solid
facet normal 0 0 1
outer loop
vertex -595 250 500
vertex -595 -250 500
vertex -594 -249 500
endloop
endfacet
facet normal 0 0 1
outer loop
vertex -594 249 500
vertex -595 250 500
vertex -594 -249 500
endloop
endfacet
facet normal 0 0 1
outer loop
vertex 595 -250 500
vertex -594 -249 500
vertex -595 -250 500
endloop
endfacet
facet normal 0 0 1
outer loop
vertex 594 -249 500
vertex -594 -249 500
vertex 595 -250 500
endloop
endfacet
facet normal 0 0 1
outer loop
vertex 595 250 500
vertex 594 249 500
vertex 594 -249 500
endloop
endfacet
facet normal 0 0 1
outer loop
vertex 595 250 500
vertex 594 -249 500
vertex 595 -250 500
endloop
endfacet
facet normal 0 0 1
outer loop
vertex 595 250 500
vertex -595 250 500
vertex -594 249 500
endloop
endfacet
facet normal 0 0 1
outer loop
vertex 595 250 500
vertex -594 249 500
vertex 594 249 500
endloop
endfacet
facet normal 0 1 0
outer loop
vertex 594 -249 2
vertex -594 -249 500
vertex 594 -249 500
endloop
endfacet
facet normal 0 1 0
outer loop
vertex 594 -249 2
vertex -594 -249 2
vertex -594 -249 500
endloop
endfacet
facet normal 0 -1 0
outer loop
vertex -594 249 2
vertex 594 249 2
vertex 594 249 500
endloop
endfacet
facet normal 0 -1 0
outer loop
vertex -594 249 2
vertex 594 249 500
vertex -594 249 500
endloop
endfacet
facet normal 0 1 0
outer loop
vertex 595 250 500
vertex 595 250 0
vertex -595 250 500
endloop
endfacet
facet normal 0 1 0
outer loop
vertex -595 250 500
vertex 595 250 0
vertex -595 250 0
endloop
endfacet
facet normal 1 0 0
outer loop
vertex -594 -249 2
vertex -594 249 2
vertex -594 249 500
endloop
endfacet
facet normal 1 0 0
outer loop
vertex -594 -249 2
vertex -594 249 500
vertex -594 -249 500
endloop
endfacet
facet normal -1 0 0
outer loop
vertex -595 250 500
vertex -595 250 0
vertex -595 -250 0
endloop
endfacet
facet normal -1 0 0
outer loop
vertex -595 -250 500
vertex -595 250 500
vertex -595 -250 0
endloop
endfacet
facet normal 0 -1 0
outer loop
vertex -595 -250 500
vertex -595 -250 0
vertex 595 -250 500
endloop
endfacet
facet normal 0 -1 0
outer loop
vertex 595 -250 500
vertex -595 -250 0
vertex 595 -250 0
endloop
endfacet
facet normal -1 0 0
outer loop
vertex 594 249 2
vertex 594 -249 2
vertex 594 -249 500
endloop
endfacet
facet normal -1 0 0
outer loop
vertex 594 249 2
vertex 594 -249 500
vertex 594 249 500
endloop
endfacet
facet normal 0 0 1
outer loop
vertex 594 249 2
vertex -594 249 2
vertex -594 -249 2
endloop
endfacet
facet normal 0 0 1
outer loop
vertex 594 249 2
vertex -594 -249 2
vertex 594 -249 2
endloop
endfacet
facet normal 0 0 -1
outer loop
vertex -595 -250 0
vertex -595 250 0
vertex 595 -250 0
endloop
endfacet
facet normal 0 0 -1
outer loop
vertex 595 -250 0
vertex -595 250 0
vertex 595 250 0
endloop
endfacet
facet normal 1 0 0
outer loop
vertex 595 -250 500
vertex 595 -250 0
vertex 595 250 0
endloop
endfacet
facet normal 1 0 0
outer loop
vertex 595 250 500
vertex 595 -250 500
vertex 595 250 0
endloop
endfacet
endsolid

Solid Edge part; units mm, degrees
sketch "Sketch1" plane through (0, 0, 0) normal (0, 0, 1) x (1, 0, 0)
  line L0 (594, 249) -> (-594, 249)
  line L1 (-594, 249) -> (-594, -249)
  line L2 (-594, -249) -> (594, -249)
  line L3 (594, -249) -> (594, 249)
  line L4 (595, 250) -> (-595, 250)
  line L5 (-595, 250) -> (-595, -250)
  line L6 (-595, -250) -> (595, -250)
  line L7 (595, -250) -> (595, 250)
extrude "Protrusion1" add sketch "Sketch1" along normal blind 500
sketch "Sketch2" plane through (0, 0, 0) normal (0, 0, 1) x (1, 0, 0)
  line L0 (-594, -249) -> (594, -249)
  line L1 (594, -249) -> (594, 249)
  line L2 (594, 249) -> (-594, 249)
  line L3 (-594, 249) -> (-594, -249)
extrude "ExtrudedProtrusion_2" add sketch "Sketch2" along normal blind 2
properties material "Acrylic Plastic (extra strong)"
